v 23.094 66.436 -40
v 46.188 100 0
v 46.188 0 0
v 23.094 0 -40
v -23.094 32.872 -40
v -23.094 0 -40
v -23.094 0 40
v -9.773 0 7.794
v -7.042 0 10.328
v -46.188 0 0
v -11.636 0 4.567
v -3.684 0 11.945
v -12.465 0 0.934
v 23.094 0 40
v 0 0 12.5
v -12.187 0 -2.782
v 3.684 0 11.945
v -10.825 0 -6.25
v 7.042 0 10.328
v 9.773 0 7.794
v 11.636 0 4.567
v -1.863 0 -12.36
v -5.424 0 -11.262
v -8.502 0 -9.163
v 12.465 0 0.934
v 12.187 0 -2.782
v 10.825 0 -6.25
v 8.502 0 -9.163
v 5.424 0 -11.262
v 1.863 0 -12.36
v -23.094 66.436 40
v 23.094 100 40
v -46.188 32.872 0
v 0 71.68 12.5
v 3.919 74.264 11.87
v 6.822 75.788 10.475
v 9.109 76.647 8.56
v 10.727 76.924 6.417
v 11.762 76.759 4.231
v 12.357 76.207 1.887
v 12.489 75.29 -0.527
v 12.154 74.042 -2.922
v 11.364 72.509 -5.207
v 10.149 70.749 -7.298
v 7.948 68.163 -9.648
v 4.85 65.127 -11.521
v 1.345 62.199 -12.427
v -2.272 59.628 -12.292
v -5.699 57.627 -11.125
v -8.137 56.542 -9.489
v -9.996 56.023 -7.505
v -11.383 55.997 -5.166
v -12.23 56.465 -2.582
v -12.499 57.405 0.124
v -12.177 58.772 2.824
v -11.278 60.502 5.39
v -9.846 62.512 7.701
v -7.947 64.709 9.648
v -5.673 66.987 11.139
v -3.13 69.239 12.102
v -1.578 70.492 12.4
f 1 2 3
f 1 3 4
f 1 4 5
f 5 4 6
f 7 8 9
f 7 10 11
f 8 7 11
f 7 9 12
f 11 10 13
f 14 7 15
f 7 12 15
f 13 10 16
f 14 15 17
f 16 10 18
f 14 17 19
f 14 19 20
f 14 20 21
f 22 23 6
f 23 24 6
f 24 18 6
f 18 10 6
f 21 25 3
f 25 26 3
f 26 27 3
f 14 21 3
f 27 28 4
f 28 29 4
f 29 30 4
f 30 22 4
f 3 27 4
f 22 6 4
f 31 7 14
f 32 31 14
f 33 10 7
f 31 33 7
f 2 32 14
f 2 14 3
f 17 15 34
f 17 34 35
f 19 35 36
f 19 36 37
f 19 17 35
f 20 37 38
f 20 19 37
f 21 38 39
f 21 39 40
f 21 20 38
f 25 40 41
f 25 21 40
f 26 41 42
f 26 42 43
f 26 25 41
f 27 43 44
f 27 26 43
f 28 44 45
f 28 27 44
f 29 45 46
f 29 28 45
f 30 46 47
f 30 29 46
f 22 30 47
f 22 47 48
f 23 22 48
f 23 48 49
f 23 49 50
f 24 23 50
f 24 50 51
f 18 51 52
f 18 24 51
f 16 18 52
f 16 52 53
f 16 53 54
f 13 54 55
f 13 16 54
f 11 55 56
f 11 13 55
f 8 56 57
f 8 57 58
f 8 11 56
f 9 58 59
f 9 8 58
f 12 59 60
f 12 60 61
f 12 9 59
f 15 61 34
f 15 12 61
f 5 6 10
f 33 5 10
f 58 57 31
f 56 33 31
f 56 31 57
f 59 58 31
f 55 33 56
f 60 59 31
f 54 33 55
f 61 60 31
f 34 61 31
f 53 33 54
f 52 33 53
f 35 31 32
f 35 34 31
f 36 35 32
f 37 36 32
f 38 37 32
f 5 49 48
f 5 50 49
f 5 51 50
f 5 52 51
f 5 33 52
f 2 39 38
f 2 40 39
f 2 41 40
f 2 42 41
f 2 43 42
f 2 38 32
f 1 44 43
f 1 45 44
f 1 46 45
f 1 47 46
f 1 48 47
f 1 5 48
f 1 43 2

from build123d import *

# Parameters (mm, degrees)
SKETCH1_R           = 12.5
BOSS_EXTRUDE1_DEPTH = 100
DRAFT8_ANGLE        = -40


with BuildPart() as part:
    # Sketch1 → Boss-Extrude1 (new body)
    with BuildSketch(Plane(origin=(0, 0, 0), x_dir=(1, 0, 0), z_dir=(0, 1, 0))):
        Polygon((46.188021535, 0), (23.094010768, 40), (-23.094010768, 40), (-46.188021535, 0), (-23.094010768, -40), (23.094010768, -40), align=None)
        with Locations(Location((0, 0, 0), (0, 0, 270))):
            Circle(SKETCH1_R, mode=Mode.SUBTRACT)
    extrude(amount=BOSS_EXTRUDE1_DEPTH)

    # Draft8
    draft8_faces = [part.faces().sort_by_distance(p)[0] for p in [
        (33.582715627, 100, -19.388989907),
    ]]
    draft(draft8_faces, Plane(origin=(23.094010768, 100, 40), x_dir=(-0.49999999999999944, 0, 0.8660254037844389), z_dir=(0.866025403784439, 0, 0.49999999999999956)), DRAFT8_ANGLE)


solid = part.part
